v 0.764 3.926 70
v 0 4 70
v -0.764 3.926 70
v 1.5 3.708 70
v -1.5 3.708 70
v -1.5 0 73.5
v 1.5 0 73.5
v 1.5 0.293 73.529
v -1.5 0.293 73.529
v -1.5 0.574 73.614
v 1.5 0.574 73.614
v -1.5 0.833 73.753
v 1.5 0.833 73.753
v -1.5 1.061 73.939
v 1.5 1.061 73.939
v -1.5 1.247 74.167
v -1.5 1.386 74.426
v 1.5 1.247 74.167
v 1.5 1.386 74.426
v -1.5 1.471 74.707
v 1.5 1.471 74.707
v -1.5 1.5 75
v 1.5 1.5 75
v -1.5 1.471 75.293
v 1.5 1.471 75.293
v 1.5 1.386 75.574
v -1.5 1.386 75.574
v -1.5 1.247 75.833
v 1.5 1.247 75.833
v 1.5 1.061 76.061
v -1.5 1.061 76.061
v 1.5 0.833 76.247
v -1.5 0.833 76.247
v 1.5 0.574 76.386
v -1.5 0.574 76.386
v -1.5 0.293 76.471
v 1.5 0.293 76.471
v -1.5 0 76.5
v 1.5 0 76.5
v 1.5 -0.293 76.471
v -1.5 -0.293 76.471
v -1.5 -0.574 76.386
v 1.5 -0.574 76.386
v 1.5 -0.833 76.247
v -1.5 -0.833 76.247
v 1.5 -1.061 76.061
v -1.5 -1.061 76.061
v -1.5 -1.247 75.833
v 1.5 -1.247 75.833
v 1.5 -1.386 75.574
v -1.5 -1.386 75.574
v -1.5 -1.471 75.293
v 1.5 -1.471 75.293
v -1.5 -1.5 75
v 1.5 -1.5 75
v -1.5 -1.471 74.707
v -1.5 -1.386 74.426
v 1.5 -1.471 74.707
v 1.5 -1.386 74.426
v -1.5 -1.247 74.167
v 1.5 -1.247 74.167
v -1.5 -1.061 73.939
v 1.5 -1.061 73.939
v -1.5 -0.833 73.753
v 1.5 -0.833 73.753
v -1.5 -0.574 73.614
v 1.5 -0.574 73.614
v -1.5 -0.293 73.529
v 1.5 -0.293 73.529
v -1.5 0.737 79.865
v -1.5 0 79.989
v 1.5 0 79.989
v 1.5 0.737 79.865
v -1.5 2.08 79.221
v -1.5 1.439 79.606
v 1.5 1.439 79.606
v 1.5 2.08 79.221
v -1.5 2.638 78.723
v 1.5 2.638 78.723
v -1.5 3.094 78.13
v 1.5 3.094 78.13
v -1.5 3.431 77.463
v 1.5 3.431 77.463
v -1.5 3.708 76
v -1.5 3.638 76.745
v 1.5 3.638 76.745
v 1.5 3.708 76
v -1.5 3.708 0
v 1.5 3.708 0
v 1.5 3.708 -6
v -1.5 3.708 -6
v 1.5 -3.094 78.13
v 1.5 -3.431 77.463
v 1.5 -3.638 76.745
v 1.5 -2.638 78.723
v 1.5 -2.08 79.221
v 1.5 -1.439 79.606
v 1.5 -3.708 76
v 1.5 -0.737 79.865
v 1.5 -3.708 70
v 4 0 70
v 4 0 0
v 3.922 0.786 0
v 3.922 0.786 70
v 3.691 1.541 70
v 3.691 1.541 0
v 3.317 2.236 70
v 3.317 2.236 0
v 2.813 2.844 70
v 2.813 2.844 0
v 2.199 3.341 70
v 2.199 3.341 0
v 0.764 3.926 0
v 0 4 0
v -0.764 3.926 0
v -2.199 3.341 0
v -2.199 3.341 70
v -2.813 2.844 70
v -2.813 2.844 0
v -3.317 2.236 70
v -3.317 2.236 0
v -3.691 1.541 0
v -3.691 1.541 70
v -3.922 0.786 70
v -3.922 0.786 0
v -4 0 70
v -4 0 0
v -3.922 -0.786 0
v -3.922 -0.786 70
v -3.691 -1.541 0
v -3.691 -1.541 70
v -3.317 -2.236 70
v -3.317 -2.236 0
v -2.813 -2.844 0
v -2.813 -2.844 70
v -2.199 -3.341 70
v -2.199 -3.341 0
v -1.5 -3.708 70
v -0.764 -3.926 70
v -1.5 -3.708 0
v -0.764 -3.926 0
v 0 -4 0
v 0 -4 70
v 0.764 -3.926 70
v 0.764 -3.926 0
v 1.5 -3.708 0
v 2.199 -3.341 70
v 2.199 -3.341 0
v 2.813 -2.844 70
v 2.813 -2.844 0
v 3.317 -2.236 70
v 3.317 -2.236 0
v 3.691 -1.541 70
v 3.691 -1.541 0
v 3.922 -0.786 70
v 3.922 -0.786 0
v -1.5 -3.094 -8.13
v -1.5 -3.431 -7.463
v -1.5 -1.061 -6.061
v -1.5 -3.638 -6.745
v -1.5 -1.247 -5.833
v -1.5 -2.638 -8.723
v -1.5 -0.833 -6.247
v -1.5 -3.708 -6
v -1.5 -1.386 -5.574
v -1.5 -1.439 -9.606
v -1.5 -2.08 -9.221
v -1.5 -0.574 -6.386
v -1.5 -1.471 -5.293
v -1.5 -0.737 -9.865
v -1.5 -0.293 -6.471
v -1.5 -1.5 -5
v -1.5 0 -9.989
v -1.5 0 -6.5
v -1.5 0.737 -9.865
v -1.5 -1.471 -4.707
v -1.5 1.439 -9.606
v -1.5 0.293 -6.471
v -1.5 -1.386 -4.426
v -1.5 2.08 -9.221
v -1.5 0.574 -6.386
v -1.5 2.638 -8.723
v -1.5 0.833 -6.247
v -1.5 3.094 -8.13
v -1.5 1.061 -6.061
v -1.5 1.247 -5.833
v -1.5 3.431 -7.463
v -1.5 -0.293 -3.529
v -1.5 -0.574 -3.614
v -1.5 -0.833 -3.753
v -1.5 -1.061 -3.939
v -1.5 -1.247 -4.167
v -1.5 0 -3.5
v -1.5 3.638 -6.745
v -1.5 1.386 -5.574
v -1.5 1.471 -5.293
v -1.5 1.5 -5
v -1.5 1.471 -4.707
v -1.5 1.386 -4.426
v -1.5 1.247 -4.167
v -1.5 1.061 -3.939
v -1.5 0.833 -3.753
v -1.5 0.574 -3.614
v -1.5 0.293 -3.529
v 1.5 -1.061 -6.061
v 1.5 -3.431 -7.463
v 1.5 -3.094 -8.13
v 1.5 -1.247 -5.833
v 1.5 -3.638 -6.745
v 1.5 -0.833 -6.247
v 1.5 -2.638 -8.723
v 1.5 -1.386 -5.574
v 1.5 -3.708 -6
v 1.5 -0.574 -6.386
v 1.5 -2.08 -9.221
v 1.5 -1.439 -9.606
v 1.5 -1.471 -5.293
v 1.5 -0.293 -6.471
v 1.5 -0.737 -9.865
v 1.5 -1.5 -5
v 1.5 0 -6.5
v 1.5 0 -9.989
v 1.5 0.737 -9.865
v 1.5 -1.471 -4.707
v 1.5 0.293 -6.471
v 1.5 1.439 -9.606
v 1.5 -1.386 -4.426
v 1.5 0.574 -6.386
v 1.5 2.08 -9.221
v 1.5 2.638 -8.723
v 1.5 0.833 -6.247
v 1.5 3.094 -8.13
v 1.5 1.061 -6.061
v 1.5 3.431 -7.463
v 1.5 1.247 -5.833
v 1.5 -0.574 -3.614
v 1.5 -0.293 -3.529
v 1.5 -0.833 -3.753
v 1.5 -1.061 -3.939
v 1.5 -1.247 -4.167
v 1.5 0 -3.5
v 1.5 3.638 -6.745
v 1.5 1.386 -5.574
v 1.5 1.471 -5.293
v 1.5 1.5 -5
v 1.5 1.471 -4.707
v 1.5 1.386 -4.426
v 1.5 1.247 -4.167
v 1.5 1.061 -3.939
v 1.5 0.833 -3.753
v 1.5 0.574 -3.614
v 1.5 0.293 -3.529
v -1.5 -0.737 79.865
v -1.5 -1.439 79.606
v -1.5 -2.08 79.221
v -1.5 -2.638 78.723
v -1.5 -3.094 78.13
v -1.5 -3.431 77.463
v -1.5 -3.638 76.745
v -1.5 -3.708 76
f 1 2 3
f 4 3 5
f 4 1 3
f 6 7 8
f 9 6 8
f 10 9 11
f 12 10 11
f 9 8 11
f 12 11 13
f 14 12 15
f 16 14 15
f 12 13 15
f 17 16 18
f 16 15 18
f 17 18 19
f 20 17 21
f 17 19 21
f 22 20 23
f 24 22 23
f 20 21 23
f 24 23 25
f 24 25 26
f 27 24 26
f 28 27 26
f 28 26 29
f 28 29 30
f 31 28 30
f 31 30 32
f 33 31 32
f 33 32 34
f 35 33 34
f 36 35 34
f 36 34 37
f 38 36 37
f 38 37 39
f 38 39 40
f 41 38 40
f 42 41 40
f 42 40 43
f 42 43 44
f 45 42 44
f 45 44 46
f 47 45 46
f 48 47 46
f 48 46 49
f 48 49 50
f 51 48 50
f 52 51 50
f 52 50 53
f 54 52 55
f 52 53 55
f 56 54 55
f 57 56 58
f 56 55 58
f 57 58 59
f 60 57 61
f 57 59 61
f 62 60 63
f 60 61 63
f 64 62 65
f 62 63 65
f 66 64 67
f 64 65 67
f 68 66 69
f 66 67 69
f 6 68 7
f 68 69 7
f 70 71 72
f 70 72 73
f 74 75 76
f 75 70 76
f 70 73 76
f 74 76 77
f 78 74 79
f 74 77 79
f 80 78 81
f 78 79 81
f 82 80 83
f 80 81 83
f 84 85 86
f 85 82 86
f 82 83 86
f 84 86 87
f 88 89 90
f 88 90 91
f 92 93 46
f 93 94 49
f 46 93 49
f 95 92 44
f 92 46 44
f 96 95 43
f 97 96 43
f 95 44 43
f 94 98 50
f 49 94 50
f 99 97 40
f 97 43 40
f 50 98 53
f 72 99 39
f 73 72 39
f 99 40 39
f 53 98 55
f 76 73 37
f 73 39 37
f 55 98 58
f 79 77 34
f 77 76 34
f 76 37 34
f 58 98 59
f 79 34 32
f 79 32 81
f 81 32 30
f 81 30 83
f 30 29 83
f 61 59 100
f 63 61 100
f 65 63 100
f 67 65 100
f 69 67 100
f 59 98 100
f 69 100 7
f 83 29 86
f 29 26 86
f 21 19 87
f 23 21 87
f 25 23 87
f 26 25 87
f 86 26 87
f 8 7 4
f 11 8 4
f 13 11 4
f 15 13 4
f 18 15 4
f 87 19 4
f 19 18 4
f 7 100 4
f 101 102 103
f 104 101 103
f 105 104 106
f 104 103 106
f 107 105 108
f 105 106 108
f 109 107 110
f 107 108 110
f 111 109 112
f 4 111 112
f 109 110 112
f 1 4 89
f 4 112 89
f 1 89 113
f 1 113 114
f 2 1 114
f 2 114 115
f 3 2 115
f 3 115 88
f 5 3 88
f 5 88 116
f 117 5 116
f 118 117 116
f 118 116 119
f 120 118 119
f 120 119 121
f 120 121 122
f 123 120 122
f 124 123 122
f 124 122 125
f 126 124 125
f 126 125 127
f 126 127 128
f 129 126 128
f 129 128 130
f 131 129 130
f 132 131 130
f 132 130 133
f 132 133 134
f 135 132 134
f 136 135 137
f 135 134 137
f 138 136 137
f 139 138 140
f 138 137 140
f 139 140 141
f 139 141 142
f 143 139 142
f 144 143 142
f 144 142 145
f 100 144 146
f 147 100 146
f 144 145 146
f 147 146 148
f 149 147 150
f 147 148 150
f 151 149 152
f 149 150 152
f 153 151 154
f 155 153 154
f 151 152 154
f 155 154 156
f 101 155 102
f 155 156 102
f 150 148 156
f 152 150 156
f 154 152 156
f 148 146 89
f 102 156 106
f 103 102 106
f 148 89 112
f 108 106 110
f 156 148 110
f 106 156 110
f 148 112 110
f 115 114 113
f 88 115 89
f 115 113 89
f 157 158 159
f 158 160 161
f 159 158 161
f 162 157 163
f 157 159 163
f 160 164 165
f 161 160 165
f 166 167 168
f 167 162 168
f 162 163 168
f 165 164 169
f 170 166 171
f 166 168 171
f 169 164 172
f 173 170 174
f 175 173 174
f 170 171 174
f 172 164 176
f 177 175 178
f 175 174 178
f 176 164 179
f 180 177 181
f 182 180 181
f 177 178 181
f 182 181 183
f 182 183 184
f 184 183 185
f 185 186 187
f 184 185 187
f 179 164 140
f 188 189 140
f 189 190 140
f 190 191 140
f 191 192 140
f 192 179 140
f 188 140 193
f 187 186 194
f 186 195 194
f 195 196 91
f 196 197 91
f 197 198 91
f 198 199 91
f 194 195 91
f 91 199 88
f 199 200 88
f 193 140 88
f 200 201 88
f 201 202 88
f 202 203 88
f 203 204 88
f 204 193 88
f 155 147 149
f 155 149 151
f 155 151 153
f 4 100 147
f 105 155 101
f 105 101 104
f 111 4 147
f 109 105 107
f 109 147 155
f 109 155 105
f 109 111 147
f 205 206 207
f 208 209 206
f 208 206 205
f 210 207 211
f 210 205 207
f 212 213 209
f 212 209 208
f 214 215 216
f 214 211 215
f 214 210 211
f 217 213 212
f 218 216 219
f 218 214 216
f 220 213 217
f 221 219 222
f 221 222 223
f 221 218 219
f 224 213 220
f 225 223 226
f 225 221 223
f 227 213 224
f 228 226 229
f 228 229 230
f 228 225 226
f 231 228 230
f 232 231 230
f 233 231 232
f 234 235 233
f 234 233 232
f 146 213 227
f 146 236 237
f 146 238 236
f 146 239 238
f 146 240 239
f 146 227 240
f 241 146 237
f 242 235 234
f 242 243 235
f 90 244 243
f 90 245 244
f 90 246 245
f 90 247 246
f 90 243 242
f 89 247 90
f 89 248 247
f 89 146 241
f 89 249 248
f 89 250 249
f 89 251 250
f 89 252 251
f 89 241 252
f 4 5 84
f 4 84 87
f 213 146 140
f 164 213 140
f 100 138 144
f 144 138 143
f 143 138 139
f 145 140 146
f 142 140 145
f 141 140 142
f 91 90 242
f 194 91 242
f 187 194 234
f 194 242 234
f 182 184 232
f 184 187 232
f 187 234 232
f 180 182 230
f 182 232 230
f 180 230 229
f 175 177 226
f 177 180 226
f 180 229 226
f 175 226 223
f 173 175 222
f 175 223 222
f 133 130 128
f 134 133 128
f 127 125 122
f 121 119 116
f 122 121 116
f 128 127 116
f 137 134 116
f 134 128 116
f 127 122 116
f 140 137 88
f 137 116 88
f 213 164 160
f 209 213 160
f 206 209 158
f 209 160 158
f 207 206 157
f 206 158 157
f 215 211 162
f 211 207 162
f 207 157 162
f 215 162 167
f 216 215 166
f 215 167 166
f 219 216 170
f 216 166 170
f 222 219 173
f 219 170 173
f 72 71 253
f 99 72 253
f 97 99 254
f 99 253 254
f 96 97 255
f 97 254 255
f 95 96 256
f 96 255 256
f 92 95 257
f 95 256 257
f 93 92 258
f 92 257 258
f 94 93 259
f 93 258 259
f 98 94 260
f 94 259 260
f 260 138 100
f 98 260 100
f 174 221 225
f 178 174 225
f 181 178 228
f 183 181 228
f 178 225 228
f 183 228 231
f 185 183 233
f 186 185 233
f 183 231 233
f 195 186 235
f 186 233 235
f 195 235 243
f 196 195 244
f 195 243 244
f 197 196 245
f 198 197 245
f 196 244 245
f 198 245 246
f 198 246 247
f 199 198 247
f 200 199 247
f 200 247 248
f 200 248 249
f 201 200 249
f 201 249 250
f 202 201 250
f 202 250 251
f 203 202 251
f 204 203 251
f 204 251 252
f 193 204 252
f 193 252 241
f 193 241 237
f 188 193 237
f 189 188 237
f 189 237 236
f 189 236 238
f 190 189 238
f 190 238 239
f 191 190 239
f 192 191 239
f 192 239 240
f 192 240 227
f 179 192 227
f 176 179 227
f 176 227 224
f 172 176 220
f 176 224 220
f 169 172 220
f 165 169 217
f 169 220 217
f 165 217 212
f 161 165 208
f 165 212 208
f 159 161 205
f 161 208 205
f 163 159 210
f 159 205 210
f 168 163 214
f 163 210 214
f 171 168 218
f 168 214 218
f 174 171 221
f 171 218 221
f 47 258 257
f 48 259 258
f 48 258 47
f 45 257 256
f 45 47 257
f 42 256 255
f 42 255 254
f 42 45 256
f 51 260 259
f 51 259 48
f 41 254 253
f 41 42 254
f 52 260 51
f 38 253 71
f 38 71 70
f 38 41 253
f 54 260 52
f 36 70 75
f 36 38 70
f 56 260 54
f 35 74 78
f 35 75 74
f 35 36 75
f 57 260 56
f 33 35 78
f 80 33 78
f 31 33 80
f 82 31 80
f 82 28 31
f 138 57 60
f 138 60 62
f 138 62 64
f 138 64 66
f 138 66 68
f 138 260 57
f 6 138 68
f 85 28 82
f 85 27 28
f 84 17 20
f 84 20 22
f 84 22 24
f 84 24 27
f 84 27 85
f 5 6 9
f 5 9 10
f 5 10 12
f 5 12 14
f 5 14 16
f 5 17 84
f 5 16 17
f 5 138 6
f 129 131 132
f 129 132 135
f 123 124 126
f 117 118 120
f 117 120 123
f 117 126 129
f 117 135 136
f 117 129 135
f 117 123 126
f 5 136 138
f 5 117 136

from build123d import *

# Parameters (mm, degrees)
CROQUIS2_R              = 4
SALIENTE_EXTRUIR1_DEPTH = 70
CROQUIS3_W              = 3
CROQUIS3_H              = 7.416198488
SALIENTE_EXTRUIR2_DEPTH = 10
CROQUIS4_W              = 3
CROQUIS4_H              = 7.416198488
SALIENTE_EXTRUIR3_DEPTH = 10
CROQUIS5_R              = 1.5
CORTAR_EXTRUIR1_DEPTH   = 81.288542146
REDONDEO1_R             = 4


with BuildPart() as part:
    # Croquis2 → Saliente-Extruir1 (new body)
    with BuildSketch(Plane.XY):
        Circle(CROQUIS2_R)
    extrude(amount=SALIENTE_EXTRUIR1_DEPTH)

    # Croquis3 → Saliente-Extruir2 (add)
    with BuildSketch(Plane.XY.offset(70)):
        Rectangle(CROQUIS3_W, CROQUIS3_H)
    extrude(amount=SALIENTE_EXTRUIR2_DEPTH)

    # Croquis4 → Saliente-Extruir3 (add)
    with BuildSketch(Plane(origin=(0, 0, 0), x_dir=(-1, 0, 0), z_dir=(0, 0, -1))):
        Rectangle(CROQUIS4_W, CROQUIS4_H)
    extrude(amount=SALIENTE_EXTRUIR3_DEPTH)

    # Croquis5 → Cortar-Extruir1 (cut, through all)
    with BuildSketch(Plane(origin=(1.5, 0, 0), x_dir=(0, 0, -1), z_dir=(1, 0, 0))):
        with Locations((-75, 0)):
            Circle(CROQUIS5_R)
        with Locations((5, 0)):
            Circle(CROQUIS5_R)
    extrude(amount=-CORTAR_EXTRUIR1_DEPTH, mode=Mode.SUBTRACT)

    # Redondeo1
    # the kernel refuses this fillet: 4 mm, written as the material it takes off along each edge
    with BuildSketch(Plane(origin=(-11.5, -3.708099244, -10), x_dir=(0, 0, 1), z_dir=(1, 0, 0)), Plane(origin=(11.5, 3.708099244, -10), x_dir=(0, 0, 1), z_dir=(-1, 0, 0))) as redondeo1_piece_1:
        with BuildLine():
            CenterArc((REDONDEO1_R, -REDONDEO1_R), REDONDEO1_R, 90, 90)
            Line((0, -REDONDEO1_R), (0, 0))
            Line((0, 0), (REDONDEO1_R, 0))
        make_face()
    extrude(amount=23, mode=Mode.SUBTRACT)
    with BuildSketch(Plane(origin=(-11.5, -3.708099244, 80), x_dir=(0, 0, -1), z_dir=(1, 0, 0)), Plane(origin=(11.5, 3.708099244, 80), x_dir=(0, 0, -1), z_dir=(-1, 0, 0))) as redondeo1_piece_2:
        with BuildLine():
            CenterArc((REDONDEO1_R, REDONDEO1_R), REDONDEO1_R, 180, 90)
            Line((0, REDONDEO1_R), (0, 0))
            Line((0, 0), (REDONDEO1_R, 0))
        make_face()
    extrude(amount=23, mode=Mode.SUBTRACT)


solid = part.part
